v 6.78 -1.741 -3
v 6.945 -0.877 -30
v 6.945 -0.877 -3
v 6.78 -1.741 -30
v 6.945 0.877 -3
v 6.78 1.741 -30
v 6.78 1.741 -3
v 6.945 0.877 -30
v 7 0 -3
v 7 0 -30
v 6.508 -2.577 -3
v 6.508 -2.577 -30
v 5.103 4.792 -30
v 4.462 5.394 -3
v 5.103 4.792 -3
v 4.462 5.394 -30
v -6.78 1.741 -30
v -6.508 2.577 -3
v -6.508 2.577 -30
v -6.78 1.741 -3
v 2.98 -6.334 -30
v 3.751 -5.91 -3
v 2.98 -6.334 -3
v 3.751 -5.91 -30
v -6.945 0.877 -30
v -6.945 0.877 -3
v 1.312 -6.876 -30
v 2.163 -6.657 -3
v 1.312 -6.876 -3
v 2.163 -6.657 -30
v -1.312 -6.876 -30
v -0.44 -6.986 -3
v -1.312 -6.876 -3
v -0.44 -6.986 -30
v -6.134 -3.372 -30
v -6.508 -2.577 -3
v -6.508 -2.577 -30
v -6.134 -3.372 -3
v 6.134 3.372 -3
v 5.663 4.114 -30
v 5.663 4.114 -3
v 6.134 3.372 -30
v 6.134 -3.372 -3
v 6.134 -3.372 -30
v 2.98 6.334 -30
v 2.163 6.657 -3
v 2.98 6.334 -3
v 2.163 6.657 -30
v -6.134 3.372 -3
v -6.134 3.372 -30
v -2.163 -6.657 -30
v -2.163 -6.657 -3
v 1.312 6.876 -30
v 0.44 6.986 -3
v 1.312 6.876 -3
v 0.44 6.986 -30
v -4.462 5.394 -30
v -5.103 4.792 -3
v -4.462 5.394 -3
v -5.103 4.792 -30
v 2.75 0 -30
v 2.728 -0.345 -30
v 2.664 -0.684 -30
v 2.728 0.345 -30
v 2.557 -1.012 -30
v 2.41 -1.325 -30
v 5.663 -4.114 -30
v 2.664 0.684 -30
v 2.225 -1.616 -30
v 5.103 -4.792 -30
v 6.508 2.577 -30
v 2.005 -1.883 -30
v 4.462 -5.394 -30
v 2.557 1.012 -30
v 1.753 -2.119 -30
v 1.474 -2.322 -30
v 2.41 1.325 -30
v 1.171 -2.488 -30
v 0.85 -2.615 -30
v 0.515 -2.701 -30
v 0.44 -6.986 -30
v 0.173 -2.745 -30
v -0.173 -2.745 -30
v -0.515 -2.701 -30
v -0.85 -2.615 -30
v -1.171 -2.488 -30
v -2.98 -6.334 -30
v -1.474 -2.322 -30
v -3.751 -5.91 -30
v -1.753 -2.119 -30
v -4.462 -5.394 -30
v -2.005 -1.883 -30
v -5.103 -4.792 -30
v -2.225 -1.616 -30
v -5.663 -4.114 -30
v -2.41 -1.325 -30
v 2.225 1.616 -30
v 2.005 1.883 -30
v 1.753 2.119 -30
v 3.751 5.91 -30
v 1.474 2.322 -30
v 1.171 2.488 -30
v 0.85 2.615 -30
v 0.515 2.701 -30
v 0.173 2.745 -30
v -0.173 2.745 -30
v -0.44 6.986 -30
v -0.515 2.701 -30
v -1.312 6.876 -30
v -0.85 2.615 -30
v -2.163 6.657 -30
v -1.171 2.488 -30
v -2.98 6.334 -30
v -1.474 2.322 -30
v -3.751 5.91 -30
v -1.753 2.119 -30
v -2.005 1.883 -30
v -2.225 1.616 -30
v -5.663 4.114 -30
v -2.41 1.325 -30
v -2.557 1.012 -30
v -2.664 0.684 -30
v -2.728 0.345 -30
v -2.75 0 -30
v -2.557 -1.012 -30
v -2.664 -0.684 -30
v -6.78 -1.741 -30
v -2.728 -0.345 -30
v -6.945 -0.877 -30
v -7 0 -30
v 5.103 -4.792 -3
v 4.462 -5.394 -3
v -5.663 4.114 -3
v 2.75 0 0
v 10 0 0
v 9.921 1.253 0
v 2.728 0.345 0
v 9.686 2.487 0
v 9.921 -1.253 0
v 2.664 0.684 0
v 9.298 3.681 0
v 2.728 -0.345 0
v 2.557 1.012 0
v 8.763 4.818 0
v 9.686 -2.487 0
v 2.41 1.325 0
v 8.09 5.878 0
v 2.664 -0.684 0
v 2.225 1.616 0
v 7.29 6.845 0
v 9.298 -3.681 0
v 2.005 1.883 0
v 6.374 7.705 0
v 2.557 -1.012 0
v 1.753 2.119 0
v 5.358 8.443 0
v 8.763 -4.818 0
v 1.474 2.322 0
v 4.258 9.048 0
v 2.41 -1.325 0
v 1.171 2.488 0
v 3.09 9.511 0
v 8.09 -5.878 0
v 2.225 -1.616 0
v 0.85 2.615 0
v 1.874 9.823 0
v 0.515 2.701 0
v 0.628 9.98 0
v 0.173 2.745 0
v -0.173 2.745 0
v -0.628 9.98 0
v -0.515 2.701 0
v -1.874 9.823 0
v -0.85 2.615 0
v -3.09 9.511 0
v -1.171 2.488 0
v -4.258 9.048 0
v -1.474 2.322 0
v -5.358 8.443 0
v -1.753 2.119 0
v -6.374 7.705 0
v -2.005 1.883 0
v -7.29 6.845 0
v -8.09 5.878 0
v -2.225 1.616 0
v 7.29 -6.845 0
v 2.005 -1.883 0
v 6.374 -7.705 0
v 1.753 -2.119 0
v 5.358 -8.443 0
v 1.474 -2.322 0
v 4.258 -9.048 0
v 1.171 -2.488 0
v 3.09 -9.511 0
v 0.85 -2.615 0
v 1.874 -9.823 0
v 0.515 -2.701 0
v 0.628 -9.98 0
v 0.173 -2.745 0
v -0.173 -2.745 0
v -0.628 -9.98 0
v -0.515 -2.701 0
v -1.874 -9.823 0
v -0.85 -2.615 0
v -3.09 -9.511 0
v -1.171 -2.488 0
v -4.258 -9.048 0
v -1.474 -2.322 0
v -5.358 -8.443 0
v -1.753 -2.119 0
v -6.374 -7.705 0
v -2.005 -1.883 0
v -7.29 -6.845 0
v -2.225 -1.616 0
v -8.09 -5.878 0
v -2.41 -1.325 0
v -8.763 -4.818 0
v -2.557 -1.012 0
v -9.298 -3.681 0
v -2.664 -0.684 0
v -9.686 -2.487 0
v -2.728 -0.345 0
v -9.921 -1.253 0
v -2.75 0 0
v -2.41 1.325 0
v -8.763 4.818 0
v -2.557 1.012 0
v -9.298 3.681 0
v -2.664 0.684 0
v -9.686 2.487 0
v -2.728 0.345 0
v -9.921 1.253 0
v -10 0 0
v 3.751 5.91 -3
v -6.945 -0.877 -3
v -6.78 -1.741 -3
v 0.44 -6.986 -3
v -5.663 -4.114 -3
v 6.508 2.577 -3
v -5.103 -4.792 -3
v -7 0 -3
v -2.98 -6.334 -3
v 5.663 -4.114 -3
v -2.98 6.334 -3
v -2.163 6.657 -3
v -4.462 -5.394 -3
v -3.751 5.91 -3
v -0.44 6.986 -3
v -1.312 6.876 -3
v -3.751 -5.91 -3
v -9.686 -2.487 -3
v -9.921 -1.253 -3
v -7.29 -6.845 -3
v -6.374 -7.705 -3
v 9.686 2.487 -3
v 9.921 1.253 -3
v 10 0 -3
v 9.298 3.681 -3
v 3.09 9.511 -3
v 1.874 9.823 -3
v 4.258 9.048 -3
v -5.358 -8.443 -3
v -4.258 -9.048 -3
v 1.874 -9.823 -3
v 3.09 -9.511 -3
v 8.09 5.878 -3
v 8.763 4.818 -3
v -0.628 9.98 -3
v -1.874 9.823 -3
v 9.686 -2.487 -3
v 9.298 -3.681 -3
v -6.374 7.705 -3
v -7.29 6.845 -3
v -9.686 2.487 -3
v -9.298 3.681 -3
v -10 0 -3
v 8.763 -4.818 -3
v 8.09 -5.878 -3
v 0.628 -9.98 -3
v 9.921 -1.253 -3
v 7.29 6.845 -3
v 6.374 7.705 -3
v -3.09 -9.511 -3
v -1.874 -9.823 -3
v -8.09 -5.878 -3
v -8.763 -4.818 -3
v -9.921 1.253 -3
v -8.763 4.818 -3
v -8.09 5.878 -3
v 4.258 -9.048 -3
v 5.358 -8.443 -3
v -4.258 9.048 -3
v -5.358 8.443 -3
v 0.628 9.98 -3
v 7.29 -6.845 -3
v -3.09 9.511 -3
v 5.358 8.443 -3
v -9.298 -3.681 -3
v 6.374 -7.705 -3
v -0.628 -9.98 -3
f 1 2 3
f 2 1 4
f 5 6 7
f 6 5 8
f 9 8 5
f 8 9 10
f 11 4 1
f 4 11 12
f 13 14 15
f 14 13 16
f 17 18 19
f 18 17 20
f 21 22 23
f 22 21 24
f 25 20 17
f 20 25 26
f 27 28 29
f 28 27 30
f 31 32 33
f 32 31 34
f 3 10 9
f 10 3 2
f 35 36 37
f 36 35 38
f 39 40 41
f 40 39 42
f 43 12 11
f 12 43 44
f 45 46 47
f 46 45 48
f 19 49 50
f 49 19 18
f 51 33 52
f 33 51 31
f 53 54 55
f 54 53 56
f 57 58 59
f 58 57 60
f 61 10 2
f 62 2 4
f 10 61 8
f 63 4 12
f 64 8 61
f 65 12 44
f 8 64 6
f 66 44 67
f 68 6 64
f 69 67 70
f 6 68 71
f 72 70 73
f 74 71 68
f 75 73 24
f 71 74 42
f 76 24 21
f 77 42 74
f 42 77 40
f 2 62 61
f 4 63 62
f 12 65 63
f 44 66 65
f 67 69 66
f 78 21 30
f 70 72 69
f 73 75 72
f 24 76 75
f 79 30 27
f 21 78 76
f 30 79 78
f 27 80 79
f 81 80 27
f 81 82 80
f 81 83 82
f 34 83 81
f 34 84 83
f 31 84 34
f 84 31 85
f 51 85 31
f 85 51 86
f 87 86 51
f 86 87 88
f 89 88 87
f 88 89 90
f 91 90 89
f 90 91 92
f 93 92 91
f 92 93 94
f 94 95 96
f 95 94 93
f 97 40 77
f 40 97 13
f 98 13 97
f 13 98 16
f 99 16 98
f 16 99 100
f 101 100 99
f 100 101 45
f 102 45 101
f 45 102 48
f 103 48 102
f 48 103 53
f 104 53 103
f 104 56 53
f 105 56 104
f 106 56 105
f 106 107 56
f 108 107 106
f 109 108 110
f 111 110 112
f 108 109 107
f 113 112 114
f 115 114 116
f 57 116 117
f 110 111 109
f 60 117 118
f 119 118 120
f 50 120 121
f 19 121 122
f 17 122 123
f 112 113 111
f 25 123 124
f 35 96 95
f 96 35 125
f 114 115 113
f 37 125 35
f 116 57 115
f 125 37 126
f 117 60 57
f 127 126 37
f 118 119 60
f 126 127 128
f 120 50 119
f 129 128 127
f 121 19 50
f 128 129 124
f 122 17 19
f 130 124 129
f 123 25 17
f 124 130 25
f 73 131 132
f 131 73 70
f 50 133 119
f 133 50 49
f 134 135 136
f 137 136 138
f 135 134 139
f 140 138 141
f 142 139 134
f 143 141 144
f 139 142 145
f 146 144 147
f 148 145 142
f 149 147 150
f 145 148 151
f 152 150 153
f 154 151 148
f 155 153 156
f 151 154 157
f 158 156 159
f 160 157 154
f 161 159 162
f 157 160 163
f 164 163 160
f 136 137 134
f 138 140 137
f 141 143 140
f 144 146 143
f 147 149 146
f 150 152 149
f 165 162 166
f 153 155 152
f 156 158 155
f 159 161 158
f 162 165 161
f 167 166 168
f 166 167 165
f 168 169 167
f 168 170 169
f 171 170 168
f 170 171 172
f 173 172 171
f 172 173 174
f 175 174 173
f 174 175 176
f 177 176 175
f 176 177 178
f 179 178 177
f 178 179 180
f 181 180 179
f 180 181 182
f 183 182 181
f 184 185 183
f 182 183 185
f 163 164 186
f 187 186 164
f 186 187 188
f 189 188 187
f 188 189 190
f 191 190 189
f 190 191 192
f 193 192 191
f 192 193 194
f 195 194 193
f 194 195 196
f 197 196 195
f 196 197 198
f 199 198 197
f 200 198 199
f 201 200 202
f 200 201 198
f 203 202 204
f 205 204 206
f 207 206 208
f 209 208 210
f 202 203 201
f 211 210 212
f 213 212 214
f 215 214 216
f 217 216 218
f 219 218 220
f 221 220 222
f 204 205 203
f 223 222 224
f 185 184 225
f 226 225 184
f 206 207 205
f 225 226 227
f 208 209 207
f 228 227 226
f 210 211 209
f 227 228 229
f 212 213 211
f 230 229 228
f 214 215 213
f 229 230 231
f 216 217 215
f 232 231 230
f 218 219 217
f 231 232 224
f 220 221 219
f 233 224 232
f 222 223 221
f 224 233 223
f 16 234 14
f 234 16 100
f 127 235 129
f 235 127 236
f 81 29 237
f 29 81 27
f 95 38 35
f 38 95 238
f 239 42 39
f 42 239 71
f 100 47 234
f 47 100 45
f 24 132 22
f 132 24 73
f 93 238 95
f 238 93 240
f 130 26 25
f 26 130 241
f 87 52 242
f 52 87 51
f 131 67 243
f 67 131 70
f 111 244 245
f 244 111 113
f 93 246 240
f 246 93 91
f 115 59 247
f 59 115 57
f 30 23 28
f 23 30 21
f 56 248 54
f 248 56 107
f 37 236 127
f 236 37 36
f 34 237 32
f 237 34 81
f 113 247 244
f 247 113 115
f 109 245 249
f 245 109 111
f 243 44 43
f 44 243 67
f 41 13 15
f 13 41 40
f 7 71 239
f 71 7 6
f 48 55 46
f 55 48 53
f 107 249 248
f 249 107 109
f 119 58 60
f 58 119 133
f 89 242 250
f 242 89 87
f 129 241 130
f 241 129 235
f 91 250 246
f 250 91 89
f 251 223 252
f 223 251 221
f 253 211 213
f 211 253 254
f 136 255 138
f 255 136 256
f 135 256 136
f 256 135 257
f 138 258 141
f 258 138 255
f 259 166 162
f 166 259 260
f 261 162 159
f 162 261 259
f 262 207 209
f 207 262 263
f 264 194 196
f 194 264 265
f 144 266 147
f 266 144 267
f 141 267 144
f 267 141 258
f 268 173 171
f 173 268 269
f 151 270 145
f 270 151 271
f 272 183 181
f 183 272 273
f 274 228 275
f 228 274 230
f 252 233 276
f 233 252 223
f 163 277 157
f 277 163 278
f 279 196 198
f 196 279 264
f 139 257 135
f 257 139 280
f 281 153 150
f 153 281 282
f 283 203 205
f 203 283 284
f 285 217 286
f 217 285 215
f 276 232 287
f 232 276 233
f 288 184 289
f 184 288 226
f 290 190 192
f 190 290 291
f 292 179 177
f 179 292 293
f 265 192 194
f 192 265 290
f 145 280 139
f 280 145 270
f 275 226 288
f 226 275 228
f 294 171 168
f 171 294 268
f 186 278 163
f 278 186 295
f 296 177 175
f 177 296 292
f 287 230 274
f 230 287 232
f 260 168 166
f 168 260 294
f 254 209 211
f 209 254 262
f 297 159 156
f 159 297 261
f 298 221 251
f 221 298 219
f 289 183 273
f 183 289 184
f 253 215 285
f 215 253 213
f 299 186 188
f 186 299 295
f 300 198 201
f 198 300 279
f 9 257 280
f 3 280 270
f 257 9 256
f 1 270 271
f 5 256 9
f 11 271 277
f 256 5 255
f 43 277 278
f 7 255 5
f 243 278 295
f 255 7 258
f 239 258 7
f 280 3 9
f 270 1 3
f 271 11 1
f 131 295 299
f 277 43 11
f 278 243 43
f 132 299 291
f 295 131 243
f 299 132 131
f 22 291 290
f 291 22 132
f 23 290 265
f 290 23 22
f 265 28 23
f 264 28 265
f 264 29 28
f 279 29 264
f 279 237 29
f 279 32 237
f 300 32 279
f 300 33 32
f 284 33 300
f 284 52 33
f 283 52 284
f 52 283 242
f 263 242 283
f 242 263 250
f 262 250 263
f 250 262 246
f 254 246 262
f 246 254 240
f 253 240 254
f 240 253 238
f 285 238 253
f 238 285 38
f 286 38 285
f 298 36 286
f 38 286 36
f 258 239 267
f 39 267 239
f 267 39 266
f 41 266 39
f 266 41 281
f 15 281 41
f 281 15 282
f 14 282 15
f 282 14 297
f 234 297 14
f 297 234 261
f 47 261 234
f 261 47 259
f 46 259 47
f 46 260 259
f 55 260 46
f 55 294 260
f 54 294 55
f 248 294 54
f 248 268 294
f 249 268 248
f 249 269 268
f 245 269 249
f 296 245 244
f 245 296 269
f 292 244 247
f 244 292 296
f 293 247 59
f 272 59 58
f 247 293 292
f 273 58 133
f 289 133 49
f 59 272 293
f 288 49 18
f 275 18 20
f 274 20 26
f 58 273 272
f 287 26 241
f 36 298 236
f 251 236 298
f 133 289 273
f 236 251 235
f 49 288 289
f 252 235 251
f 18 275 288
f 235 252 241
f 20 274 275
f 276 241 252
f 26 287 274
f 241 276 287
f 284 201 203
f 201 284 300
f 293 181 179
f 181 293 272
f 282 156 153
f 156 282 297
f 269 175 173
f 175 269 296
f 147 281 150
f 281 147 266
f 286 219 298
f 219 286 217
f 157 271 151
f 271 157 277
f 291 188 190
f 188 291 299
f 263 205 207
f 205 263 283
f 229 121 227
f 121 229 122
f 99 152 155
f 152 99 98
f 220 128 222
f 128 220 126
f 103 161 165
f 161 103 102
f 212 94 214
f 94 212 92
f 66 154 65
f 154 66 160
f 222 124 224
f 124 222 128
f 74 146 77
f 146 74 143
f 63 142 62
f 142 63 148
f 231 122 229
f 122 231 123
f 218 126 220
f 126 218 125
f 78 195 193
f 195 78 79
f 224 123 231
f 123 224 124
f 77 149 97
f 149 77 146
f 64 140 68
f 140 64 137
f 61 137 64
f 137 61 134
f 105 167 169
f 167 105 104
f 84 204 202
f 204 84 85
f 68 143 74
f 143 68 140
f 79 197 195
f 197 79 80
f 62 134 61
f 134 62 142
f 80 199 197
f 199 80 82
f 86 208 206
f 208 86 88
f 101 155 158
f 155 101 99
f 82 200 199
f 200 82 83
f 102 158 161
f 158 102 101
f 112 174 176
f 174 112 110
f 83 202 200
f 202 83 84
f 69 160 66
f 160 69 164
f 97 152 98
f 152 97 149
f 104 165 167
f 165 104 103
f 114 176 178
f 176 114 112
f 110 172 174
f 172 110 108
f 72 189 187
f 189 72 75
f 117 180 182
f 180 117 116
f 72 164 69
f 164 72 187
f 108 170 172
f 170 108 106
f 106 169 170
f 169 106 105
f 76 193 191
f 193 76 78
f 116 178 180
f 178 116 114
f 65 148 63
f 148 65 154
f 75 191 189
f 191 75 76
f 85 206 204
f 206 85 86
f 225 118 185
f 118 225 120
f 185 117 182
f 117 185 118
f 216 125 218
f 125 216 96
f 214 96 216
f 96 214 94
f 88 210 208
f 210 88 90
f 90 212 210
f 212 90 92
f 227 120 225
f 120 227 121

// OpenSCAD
$fn = 50;


difference() {
	union() {
		translate(v = [0, 0, -30.0000000000]) {
			cylinder(h = 30, r = 7.0000000000);
		}
		translate(v = [0, 0, -3.0000000000]) {
			cylinder(h = 3, r = 10.0000000000);
		}
	}
	union() {
		#translate(v = [0, 0, -30]) {
			cylinder(h = 30, r = 2.7500000000);
		}
	}
}
